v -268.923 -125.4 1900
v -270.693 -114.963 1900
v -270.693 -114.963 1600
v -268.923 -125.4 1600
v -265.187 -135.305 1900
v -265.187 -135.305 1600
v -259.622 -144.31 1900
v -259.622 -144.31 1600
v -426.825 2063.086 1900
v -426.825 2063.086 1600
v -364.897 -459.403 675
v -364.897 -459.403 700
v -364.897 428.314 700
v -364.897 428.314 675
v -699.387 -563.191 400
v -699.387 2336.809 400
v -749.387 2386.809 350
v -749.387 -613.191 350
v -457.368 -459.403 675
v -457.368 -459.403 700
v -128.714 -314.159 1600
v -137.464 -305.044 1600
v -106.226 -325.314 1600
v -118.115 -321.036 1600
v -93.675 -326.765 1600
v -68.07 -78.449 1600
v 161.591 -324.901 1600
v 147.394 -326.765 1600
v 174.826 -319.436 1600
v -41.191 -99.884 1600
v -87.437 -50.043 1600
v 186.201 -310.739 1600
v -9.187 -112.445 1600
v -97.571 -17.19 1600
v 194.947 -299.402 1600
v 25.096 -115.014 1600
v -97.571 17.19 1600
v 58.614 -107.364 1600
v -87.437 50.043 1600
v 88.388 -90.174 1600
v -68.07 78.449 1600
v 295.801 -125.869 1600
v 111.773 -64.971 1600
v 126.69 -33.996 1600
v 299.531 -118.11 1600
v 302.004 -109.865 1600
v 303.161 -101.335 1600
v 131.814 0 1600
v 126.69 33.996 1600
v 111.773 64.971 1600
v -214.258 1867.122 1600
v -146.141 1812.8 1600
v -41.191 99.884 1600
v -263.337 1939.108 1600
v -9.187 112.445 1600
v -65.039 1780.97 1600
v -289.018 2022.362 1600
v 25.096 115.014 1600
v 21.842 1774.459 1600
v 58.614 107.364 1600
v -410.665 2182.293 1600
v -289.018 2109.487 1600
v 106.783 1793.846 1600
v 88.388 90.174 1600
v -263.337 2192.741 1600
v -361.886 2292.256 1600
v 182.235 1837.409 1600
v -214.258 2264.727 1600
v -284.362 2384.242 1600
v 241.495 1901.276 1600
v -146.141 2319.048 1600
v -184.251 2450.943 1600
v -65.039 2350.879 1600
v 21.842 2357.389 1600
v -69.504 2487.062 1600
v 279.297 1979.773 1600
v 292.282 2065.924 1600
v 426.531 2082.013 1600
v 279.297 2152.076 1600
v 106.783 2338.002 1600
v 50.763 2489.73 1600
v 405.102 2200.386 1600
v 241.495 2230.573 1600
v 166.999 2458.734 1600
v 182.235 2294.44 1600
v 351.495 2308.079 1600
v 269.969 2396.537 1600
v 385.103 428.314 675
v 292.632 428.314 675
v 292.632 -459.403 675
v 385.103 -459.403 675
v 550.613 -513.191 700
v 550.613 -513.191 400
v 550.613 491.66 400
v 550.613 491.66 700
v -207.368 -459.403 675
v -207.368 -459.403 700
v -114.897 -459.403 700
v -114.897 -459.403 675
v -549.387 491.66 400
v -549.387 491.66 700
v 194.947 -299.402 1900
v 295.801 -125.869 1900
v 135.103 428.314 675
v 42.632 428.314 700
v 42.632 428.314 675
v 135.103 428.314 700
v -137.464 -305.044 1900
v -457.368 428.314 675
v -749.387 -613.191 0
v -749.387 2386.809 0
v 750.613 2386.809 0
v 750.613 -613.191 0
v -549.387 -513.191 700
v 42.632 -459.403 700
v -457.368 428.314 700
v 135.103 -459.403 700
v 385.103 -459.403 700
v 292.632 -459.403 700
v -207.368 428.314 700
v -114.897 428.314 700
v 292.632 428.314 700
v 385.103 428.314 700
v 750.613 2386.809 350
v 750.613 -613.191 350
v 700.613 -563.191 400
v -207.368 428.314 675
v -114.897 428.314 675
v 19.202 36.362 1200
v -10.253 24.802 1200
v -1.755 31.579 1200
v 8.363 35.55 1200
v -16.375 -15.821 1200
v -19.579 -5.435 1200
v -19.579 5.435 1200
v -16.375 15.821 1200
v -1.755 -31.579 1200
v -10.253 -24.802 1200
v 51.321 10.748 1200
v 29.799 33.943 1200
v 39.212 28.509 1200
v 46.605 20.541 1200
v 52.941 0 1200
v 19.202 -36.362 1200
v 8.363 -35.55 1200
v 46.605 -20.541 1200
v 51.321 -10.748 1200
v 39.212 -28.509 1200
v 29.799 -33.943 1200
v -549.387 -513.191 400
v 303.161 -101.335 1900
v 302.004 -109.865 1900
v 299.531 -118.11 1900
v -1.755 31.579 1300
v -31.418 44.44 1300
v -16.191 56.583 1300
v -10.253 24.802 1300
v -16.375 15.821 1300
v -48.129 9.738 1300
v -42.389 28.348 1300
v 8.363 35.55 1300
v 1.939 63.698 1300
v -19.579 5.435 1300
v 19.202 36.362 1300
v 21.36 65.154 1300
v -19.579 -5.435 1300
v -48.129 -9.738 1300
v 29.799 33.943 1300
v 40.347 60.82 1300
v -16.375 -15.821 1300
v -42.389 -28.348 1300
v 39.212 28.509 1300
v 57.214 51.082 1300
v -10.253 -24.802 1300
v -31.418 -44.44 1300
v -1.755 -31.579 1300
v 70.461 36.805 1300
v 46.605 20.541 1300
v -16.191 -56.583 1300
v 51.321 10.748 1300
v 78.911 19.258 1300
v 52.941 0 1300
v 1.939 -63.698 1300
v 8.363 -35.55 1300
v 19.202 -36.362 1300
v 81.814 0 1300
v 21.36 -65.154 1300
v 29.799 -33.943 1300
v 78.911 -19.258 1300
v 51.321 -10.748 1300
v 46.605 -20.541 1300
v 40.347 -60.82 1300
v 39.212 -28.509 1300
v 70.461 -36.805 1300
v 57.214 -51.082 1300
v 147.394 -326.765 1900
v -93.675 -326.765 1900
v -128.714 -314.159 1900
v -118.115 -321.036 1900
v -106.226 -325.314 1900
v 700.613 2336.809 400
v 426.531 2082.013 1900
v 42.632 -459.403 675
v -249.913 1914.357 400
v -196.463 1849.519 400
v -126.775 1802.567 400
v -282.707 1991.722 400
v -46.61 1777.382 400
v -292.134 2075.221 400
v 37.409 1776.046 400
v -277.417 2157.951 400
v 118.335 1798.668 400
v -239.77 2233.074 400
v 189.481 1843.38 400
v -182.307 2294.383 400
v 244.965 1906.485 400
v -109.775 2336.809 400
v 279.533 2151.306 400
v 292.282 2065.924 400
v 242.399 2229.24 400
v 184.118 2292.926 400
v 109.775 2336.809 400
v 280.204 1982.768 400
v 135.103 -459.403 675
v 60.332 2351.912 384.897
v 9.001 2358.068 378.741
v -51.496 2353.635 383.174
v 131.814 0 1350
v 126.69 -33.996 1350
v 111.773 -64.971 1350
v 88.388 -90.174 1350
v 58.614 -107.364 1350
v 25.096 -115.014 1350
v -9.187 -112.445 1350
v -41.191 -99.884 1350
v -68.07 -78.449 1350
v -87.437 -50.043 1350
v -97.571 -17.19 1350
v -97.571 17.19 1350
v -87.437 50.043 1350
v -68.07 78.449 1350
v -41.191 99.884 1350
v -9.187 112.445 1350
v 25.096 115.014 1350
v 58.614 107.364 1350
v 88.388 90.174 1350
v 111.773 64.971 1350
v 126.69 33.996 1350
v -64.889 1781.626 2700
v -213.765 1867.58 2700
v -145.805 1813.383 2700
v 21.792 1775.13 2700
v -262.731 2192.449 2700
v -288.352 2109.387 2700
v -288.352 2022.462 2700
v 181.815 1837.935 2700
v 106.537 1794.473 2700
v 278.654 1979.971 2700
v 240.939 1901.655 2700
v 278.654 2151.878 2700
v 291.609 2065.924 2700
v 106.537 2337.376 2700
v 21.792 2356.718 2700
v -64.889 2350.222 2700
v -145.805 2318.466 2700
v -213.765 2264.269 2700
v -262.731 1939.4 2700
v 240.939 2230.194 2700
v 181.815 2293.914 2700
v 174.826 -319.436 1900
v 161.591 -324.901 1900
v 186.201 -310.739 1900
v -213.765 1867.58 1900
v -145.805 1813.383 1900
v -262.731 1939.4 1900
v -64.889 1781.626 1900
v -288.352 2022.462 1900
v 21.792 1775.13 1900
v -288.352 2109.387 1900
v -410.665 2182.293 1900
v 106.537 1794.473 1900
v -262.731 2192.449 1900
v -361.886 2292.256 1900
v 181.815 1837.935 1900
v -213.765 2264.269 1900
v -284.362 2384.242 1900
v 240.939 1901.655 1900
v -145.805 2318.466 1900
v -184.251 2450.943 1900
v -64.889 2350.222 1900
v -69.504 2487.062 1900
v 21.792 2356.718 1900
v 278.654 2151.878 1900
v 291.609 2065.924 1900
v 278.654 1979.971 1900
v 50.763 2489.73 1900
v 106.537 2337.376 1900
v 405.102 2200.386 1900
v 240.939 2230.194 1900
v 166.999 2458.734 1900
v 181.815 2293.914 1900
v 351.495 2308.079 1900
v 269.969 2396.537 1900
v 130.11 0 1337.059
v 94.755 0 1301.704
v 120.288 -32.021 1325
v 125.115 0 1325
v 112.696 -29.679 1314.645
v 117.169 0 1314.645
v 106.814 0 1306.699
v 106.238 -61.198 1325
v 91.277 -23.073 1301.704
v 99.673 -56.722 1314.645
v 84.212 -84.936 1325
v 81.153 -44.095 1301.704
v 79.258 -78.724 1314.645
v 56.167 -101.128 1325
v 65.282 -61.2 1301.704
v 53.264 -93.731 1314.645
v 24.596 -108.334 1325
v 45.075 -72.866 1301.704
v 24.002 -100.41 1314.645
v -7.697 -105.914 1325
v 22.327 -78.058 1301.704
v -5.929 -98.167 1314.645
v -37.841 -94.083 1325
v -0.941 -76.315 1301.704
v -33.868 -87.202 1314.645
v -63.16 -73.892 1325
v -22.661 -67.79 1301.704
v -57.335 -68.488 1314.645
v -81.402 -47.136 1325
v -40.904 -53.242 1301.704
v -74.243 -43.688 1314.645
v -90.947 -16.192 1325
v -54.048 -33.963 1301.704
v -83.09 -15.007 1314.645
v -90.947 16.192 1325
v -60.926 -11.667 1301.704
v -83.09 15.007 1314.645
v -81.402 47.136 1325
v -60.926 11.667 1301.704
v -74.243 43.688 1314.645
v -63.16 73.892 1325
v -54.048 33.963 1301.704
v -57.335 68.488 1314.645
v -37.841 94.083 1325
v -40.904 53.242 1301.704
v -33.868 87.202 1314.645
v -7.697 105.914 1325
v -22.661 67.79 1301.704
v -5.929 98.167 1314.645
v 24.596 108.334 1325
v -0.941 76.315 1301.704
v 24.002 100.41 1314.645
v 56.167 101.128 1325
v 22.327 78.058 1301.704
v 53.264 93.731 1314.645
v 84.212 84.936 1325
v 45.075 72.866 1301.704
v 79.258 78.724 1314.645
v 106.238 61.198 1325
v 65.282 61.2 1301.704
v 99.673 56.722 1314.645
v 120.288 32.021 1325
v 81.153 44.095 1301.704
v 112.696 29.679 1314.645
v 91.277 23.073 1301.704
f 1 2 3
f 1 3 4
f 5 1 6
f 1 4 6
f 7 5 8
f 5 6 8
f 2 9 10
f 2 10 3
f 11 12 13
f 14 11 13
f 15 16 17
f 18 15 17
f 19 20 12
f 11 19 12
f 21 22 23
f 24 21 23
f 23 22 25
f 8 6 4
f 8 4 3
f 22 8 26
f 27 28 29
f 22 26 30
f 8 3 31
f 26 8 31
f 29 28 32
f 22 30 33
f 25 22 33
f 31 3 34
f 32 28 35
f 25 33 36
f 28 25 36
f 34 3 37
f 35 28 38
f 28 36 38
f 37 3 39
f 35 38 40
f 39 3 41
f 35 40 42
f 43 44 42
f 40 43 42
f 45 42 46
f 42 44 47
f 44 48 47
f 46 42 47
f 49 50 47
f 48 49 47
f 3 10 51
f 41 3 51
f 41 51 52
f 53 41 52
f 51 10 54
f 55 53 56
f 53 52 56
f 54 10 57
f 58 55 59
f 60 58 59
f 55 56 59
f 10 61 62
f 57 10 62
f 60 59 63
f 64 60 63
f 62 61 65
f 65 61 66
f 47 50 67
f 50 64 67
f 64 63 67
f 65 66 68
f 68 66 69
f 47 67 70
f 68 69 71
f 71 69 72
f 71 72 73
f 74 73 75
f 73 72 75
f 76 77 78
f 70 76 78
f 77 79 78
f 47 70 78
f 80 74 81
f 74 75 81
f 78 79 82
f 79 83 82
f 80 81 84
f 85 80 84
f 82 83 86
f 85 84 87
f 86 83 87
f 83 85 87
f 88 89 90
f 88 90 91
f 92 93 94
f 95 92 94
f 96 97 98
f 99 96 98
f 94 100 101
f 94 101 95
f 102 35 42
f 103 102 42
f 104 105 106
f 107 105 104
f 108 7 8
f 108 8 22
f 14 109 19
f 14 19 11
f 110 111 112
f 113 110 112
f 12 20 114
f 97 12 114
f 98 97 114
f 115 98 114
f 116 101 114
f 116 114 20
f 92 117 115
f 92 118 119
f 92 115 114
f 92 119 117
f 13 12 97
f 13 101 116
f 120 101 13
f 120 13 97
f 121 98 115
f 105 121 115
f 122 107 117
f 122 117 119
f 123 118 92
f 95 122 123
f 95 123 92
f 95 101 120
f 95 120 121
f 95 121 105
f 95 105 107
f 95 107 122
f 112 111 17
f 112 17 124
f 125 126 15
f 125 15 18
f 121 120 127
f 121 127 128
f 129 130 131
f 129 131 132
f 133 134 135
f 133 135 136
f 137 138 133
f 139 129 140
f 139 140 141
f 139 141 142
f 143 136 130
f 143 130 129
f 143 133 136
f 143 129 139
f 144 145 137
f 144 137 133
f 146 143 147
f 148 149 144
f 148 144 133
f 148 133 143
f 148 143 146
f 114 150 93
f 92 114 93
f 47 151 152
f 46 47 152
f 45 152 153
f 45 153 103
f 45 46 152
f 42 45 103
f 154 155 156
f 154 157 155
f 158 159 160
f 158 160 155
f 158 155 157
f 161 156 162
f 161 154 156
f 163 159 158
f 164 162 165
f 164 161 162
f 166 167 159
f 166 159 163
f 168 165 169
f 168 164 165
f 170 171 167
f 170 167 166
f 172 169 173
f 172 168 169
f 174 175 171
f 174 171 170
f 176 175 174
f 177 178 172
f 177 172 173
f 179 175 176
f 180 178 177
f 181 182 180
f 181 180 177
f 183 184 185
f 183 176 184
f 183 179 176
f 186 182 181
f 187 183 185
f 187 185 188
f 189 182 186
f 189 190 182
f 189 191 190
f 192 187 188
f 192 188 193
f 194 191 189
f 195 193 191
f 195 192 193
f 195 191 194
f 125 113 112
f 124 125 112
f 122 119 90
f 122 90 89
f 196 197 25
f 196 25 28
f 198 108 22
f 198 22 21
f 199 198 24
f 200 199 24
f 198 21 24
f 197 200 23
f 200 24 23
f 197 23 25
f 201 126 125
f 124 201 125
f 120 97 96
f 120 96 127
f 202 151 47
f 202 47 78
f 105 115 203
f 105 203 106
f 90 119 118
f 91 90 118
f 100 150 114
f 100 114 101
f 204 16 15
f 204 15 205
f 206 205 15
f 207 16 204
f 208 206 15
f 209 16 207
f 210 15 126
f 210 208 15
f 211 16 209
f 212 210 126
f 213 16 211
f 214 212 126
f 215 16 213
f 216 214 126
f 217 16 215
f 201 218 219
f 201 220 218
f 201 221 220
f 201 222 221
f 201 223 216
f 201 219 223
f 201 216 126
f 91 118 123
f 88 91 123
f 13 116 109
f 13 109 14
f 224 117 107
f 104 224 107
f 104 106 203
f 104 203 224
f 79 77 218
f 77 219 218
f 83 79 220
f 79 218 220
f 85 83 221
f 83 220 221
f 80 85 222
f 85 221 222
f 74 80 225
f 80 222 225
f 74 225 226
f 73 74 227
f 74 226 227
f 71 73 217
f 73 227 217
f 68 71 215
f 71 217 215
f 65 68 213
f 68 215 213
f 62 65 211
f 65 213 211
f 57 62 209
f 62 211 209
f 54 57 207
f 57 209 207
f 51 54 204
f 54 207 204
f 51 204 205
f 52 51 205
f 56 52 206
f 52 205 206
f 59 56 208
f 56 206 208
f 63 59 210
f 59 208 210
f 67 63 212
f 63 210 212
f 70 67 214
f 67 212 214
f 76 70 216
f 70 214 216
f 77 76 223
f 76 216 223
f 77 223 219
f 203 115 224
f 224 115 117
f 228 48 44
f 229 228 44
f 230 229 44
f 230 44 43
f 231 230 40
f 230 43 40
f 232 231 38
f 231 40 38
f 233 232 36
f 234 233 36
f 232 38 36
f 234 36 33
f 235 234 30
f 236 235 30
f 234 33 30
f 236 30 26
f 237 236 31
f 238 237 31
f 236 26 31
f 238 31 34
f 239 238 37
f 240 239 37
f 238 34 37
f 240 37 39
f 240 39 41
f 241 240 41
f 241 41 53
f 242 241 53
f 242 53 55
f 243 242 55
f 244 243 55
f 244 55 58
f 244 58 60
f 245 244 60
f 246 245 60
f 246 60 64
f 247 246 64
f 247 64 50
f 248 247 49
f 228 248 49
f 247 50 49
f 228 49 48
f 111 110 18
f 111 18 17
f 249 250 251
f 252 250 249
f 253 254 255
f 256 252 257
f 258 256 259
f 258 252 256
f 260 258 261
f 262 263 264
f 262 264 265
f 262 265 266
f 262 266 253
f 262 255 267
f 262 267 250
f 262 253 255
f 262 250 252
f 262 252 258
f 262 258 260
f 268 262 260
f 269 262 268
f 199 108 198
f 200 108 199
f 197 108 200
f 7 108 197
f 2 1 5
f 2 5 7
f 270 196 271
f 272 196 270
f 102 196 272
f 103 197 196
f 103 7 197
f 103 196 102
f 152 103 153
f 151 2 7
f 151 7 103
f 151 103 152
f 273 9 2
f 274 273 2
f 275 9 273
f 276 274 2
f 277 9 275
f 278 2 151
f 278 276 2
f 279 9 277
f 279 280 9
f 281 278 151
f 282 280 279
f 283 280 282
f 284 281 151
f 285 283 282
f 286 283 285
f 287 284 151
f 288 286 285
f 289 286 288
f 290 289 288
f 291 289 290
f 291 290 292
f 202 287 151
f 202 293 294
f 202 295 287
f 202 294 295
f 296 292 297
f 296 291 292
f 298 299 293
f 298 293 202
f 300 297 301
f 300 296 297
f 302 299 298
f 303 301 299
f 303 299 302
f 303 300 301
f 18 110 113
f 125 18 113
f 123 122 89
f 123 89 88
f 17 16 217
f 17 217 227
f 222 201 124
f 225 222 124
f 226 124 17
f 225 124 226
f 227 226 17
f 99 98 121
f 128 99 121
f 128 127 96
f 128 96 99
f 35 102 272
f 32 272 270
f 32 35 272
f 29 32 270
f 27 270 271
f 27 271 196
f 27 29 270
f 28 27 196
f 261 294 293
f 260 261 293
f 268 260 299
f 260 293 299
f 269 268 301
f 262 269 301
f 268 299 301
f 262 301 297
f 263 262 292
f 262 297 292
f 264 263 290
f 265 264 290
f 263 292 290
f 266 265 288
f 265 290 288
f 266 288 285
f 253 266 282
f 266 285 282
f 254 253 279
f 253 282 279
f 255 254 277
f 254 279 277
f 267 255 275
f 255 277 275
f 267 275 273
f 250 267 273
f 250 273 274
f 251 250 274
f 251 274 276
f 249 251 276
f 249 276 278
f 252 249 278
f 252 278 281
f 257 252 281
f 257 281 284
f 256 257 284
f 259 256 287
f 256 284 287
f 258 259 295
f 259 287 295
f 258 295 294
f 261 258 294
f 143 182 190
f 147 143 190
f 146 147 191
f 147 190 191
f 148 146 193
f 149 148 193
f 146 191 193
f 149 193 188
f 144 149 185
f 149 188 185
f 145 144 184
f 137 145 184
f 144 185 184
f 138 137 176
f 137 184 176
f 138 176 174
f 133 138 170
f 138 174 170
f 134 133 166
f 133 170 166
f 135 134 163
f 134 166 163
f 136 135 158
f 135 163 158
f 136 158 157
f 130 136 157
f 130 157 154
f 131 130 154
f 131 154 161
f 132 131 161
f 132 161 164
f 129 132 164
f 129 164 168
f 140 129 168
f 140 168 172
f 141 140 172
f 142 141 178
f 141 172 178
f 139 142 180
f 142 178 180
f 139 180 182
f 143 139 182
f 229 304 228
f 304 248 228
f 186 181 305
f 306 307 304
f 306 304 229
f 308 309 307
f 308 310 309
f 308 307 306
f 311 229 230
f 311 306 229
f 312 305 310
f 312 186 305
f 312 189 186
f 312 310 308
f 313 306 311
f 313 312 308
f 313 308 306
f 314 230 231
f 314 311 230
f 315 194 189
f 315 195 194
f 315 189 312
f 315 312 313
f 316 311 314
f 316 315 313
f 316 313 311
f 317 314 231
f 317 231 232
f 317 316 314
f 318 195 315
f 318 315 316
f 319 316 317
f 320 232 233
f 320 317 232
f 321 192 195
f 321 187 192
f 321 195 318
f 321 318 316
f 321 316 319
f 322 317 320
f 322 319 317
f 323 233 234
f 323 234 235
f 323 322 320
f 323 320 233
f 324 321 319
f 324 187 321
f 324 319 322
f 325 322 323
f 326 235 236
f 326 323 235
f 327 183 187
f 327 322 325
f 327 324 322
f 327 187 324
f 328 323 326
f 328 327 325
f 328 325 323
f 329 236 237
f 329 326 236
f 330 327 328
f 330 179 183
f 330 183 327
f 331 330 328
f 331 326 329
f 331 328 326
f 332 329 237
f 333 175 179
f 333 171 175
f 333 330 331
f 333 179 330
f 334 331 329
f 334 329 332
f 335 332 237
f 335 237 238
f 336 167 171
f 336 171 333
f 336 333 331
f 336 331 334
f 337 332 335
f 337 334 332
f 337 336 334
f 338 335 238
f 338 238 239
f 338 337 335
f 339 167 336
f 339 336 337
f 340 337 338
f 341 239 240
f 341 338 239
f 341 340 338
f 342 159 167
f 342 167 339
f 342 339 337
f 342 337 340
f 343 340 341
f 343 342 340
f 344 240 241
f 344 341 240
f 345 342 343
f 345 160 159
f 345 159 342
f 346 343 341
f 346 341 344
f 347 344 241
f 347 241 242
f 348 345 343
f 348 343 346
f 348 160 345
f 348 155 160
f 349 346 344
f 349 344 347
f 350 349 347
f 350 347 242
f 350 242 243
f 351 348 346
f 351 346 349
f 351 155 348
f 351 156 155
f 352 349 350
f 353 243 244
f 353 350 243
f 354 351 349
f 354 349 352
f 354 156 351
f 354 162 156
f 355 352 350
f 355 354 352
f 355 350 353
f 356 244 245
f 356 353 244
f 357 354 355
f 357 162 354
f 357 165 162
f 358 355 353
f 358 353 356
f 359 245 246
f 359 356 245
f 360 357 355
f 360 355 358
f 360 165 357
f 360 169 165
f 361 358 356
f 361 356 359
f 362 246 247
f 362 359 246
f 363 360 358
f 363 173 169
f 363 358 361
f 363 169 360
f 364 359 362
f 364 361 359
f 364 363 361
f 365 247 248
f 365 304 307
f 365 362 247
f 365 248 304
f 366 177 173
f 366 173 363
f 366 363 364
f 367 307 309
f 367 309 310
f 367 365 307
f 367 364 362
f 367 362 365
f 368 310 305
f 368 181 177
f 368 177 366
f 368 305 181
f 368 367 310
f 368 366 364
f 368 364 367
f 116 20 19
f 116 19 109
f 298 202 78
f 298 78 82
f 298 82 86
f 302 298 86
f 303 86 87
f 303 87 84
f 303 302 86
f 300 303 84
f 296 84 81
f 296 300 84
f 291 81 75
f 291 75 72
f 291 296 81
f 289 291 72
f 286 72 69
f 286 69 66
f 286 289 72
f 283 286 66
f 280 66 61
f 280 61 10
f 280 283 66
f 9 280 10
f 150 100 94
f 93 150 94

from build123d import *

# Parameters (mm, degrees)
F0_W          = 1500
F0_H          = 3000
F1_DEPTH      = 400
F2_R          = 292.2823500565
F3_DEPTH      = 1500
F4_W          = 1100
F4_H          = 1004.8507809427
F5_DEPTH      = 300
F6_W          = 92.4705266953
F6_H          = 887.717038393
F7_DEPTH      = 25
F9_DEPTH      = 300
F10_R         = 115.3363260379
F11_DEPTH     = 300
F12_R         = 50
F13_R         = 36.4638211497
F14_DEPTH     = 100
F15_T1_DEPTH  = 3257.1682987966
F15_T3_DEPTH  = 1757.1682987966
F15_T8_DEPTH  = 1757.1682987966
F15_S9_R      = 292.2823500565
F15_T10_DEPTH = 881
F16_R         = 55
F17_R         = 291.60933864
F18_DEPTH     = 800


# Not quite as in the source:
# - a fillet or chamfer that OpenCascade refuses, or shapes differently, is made with other operations: its cross-section is extruded or revolved along the edge and cut away or added


with BuildPart() as f1:
    # F0 (on Top) → F1 (new body)
    with BuildSketch(Plane.XY):
        with Locations((0.6129965186, 886.8090430593)):
            Rectangle(F0_W, F0_H)
    extrude(amount=F1_DEPTH)

    # F2 (on face) → F3 (join)
    with BuildSketch(Plane.XY.offset(400)):
        with Locations((0, 2065.9244060516)):
            Circle(F2_R)
    extrude(amount=F3_DEPTH)

    # F8 (on face) → F9 (join)
    with BuildSketch(Plane.XY.offset(1900)):
        with BuildLine():
            ThreePointArc((426.5312004435, 2082.0133865738), (-9.4648371748, 2492.653989164), (-426.8250972731, 2063.0859938416))
            Line((-426.8250972731, 2063.0859938416), (-269.5226555892, -131.283150546))
            Line((-269.5226555892, -131.283150546), (-120.9565666461, -326.7648934487))
            Line((-120.9565666461, -326.7648934487), (179.0434333539, -326.7648934487))
            Line((179.0434333539, -326.7648934487), (302.4182868002, -114.4829108661))
            Line((302.4182868002, -114.4829108661), (426.5312004435, 2082.0133865738))
        make_face()
    extrude(amount=-F9_DEPTH)

    # F10 (on face) → F11 (join)
    with BuildSketch(Plane(origin=(0, 0, 1600), x_dir=(1, 0, 0), z_dir=(0, 0, -1))):
        with Locations((16.4773444108, 0)):
            Circle(F10_R)
    extrude(amount=F11_DEPTH)

    # F12
    f12_edges = [f1.edges().sort_by_distance(p)[0] for p in [
        (-98.858982, 0, 1300),
    ]]
    fillet(f12_edges, radius=F12_R)

    # F13 (on face) → F14 (join)
    with BuildSketch(Plane(origin=(0, 0, 1300), x_dir=(1, 0, 0), z_dir=(0, 0, -1))):
        with Locations((16.4773444108, 0)):
            Circle(F13_R)
    extrude(amount=F14_DEPTH)

    # F15: chamfer of 50 on 4 edges, made by hand

    # F15_s2 → F15_t1 (cut)
    with BuildSketch(Plane.XZ.offset(-2515.3931924576)):
        Polygon((700.6129965186, 400), (750.6129965186, 350), (750.6129965186, 400), align=None)
        Polygon((-699.3870034814, 400), (-749.3870034814, 350), (-749.3870034814, 400), align=None)
    extrude(amount=F15_T1_DEPTH, mode=Mode.SUBTRACT)

    # F15_s4 → F15_t3 (cut)
    with BuildSketch(Plane.YZ.offset(-877.9711528797)):
        Polygon((-563.1909569407, 400), (-613.1909569407, 350), (-613.1909569407, 400), align=None)
    extrude(amount=F15_T3_DEPTH, mode=Mode.SUBTRACT)


with BuildPart() as f5:
    # F4 (on face) → F5 (new body)
    with BuildSketch(Plane.XY.offset(400)):
        with Locations((0.6129965186, -10.7655664693)):
            Rectangle(F4_W, F4_H)
    extrude(amount=F5_DEPTH)

    # F6 (on face) → F7 (cut)
    with BuildSketch(Plane.XY.offset(700)):
        with Locations((-411.1327528954, -15.5441612005)):
            Rectangle(F6_W, F6_H)
        with Locations((-161.1327528954, -15.5441612005)):
            Rectangle(F6_W, F6_H)
        with Locations((88.8672471046, -15.5441612005)):
            Rectangle(F6_W, F6_H)
        with Locations((338.8672471046, -15.5441612005)):
            Rectangle(F6_W, F6_H)
    extrude(amount=-F7_DEPTH, mode=Mode.SUBTRACT)


with BuildPart() as f15_tool6:
    # F15_s7 → F15_t8 (new body)
    with BuildSketch(Plane.YZ.offset(879.1971459169)):
        Polygon((2336.8090430593, 400), (2386.8090430593, 350), (2386.8090430593, 400), align=None)
    extrude(amount=-F15_T8_DEPTH)

    # F15_s9 → F15_t10 (cut, symmetric)
    with BuildSketch(Plane.XY.offset(375)):
        with Locations((0, 2065.9244060516)):
            Circle(F15_S9_R)
    extrude(amount=F15_T10_DEPTH, both=True, mode=Mode.SUBTRACT)


with BuildPart() as f1_1:
    add(f1.part)

    # F15_t5: cut F15_tool6
    add(f15_tool6.part, mode=Mode.SUBTRACT)

    # F16
    f16_edges = [f1_1.edges().sort_by_distance(p)[0] for p in [
        (302.418287, -114.482911, 1750),
        (179.043433, -326.764893, 1750),
        (-120.956567, -326.764893, 1750),
        (-269.522656, -131.283151, 1750),
    ]]
    fillet(f16_edges, radius=F16_R)

    # F17 (on face) → F18 (join)
    with BuildSketch(Plane.XY.offset(1900)):
        with Locations((0, 2065.9244060516)):
            Circle(F17_R)
    extrude(amount=F18_DEPTH)


solid = Compound([f5.part, f1_1.part])
